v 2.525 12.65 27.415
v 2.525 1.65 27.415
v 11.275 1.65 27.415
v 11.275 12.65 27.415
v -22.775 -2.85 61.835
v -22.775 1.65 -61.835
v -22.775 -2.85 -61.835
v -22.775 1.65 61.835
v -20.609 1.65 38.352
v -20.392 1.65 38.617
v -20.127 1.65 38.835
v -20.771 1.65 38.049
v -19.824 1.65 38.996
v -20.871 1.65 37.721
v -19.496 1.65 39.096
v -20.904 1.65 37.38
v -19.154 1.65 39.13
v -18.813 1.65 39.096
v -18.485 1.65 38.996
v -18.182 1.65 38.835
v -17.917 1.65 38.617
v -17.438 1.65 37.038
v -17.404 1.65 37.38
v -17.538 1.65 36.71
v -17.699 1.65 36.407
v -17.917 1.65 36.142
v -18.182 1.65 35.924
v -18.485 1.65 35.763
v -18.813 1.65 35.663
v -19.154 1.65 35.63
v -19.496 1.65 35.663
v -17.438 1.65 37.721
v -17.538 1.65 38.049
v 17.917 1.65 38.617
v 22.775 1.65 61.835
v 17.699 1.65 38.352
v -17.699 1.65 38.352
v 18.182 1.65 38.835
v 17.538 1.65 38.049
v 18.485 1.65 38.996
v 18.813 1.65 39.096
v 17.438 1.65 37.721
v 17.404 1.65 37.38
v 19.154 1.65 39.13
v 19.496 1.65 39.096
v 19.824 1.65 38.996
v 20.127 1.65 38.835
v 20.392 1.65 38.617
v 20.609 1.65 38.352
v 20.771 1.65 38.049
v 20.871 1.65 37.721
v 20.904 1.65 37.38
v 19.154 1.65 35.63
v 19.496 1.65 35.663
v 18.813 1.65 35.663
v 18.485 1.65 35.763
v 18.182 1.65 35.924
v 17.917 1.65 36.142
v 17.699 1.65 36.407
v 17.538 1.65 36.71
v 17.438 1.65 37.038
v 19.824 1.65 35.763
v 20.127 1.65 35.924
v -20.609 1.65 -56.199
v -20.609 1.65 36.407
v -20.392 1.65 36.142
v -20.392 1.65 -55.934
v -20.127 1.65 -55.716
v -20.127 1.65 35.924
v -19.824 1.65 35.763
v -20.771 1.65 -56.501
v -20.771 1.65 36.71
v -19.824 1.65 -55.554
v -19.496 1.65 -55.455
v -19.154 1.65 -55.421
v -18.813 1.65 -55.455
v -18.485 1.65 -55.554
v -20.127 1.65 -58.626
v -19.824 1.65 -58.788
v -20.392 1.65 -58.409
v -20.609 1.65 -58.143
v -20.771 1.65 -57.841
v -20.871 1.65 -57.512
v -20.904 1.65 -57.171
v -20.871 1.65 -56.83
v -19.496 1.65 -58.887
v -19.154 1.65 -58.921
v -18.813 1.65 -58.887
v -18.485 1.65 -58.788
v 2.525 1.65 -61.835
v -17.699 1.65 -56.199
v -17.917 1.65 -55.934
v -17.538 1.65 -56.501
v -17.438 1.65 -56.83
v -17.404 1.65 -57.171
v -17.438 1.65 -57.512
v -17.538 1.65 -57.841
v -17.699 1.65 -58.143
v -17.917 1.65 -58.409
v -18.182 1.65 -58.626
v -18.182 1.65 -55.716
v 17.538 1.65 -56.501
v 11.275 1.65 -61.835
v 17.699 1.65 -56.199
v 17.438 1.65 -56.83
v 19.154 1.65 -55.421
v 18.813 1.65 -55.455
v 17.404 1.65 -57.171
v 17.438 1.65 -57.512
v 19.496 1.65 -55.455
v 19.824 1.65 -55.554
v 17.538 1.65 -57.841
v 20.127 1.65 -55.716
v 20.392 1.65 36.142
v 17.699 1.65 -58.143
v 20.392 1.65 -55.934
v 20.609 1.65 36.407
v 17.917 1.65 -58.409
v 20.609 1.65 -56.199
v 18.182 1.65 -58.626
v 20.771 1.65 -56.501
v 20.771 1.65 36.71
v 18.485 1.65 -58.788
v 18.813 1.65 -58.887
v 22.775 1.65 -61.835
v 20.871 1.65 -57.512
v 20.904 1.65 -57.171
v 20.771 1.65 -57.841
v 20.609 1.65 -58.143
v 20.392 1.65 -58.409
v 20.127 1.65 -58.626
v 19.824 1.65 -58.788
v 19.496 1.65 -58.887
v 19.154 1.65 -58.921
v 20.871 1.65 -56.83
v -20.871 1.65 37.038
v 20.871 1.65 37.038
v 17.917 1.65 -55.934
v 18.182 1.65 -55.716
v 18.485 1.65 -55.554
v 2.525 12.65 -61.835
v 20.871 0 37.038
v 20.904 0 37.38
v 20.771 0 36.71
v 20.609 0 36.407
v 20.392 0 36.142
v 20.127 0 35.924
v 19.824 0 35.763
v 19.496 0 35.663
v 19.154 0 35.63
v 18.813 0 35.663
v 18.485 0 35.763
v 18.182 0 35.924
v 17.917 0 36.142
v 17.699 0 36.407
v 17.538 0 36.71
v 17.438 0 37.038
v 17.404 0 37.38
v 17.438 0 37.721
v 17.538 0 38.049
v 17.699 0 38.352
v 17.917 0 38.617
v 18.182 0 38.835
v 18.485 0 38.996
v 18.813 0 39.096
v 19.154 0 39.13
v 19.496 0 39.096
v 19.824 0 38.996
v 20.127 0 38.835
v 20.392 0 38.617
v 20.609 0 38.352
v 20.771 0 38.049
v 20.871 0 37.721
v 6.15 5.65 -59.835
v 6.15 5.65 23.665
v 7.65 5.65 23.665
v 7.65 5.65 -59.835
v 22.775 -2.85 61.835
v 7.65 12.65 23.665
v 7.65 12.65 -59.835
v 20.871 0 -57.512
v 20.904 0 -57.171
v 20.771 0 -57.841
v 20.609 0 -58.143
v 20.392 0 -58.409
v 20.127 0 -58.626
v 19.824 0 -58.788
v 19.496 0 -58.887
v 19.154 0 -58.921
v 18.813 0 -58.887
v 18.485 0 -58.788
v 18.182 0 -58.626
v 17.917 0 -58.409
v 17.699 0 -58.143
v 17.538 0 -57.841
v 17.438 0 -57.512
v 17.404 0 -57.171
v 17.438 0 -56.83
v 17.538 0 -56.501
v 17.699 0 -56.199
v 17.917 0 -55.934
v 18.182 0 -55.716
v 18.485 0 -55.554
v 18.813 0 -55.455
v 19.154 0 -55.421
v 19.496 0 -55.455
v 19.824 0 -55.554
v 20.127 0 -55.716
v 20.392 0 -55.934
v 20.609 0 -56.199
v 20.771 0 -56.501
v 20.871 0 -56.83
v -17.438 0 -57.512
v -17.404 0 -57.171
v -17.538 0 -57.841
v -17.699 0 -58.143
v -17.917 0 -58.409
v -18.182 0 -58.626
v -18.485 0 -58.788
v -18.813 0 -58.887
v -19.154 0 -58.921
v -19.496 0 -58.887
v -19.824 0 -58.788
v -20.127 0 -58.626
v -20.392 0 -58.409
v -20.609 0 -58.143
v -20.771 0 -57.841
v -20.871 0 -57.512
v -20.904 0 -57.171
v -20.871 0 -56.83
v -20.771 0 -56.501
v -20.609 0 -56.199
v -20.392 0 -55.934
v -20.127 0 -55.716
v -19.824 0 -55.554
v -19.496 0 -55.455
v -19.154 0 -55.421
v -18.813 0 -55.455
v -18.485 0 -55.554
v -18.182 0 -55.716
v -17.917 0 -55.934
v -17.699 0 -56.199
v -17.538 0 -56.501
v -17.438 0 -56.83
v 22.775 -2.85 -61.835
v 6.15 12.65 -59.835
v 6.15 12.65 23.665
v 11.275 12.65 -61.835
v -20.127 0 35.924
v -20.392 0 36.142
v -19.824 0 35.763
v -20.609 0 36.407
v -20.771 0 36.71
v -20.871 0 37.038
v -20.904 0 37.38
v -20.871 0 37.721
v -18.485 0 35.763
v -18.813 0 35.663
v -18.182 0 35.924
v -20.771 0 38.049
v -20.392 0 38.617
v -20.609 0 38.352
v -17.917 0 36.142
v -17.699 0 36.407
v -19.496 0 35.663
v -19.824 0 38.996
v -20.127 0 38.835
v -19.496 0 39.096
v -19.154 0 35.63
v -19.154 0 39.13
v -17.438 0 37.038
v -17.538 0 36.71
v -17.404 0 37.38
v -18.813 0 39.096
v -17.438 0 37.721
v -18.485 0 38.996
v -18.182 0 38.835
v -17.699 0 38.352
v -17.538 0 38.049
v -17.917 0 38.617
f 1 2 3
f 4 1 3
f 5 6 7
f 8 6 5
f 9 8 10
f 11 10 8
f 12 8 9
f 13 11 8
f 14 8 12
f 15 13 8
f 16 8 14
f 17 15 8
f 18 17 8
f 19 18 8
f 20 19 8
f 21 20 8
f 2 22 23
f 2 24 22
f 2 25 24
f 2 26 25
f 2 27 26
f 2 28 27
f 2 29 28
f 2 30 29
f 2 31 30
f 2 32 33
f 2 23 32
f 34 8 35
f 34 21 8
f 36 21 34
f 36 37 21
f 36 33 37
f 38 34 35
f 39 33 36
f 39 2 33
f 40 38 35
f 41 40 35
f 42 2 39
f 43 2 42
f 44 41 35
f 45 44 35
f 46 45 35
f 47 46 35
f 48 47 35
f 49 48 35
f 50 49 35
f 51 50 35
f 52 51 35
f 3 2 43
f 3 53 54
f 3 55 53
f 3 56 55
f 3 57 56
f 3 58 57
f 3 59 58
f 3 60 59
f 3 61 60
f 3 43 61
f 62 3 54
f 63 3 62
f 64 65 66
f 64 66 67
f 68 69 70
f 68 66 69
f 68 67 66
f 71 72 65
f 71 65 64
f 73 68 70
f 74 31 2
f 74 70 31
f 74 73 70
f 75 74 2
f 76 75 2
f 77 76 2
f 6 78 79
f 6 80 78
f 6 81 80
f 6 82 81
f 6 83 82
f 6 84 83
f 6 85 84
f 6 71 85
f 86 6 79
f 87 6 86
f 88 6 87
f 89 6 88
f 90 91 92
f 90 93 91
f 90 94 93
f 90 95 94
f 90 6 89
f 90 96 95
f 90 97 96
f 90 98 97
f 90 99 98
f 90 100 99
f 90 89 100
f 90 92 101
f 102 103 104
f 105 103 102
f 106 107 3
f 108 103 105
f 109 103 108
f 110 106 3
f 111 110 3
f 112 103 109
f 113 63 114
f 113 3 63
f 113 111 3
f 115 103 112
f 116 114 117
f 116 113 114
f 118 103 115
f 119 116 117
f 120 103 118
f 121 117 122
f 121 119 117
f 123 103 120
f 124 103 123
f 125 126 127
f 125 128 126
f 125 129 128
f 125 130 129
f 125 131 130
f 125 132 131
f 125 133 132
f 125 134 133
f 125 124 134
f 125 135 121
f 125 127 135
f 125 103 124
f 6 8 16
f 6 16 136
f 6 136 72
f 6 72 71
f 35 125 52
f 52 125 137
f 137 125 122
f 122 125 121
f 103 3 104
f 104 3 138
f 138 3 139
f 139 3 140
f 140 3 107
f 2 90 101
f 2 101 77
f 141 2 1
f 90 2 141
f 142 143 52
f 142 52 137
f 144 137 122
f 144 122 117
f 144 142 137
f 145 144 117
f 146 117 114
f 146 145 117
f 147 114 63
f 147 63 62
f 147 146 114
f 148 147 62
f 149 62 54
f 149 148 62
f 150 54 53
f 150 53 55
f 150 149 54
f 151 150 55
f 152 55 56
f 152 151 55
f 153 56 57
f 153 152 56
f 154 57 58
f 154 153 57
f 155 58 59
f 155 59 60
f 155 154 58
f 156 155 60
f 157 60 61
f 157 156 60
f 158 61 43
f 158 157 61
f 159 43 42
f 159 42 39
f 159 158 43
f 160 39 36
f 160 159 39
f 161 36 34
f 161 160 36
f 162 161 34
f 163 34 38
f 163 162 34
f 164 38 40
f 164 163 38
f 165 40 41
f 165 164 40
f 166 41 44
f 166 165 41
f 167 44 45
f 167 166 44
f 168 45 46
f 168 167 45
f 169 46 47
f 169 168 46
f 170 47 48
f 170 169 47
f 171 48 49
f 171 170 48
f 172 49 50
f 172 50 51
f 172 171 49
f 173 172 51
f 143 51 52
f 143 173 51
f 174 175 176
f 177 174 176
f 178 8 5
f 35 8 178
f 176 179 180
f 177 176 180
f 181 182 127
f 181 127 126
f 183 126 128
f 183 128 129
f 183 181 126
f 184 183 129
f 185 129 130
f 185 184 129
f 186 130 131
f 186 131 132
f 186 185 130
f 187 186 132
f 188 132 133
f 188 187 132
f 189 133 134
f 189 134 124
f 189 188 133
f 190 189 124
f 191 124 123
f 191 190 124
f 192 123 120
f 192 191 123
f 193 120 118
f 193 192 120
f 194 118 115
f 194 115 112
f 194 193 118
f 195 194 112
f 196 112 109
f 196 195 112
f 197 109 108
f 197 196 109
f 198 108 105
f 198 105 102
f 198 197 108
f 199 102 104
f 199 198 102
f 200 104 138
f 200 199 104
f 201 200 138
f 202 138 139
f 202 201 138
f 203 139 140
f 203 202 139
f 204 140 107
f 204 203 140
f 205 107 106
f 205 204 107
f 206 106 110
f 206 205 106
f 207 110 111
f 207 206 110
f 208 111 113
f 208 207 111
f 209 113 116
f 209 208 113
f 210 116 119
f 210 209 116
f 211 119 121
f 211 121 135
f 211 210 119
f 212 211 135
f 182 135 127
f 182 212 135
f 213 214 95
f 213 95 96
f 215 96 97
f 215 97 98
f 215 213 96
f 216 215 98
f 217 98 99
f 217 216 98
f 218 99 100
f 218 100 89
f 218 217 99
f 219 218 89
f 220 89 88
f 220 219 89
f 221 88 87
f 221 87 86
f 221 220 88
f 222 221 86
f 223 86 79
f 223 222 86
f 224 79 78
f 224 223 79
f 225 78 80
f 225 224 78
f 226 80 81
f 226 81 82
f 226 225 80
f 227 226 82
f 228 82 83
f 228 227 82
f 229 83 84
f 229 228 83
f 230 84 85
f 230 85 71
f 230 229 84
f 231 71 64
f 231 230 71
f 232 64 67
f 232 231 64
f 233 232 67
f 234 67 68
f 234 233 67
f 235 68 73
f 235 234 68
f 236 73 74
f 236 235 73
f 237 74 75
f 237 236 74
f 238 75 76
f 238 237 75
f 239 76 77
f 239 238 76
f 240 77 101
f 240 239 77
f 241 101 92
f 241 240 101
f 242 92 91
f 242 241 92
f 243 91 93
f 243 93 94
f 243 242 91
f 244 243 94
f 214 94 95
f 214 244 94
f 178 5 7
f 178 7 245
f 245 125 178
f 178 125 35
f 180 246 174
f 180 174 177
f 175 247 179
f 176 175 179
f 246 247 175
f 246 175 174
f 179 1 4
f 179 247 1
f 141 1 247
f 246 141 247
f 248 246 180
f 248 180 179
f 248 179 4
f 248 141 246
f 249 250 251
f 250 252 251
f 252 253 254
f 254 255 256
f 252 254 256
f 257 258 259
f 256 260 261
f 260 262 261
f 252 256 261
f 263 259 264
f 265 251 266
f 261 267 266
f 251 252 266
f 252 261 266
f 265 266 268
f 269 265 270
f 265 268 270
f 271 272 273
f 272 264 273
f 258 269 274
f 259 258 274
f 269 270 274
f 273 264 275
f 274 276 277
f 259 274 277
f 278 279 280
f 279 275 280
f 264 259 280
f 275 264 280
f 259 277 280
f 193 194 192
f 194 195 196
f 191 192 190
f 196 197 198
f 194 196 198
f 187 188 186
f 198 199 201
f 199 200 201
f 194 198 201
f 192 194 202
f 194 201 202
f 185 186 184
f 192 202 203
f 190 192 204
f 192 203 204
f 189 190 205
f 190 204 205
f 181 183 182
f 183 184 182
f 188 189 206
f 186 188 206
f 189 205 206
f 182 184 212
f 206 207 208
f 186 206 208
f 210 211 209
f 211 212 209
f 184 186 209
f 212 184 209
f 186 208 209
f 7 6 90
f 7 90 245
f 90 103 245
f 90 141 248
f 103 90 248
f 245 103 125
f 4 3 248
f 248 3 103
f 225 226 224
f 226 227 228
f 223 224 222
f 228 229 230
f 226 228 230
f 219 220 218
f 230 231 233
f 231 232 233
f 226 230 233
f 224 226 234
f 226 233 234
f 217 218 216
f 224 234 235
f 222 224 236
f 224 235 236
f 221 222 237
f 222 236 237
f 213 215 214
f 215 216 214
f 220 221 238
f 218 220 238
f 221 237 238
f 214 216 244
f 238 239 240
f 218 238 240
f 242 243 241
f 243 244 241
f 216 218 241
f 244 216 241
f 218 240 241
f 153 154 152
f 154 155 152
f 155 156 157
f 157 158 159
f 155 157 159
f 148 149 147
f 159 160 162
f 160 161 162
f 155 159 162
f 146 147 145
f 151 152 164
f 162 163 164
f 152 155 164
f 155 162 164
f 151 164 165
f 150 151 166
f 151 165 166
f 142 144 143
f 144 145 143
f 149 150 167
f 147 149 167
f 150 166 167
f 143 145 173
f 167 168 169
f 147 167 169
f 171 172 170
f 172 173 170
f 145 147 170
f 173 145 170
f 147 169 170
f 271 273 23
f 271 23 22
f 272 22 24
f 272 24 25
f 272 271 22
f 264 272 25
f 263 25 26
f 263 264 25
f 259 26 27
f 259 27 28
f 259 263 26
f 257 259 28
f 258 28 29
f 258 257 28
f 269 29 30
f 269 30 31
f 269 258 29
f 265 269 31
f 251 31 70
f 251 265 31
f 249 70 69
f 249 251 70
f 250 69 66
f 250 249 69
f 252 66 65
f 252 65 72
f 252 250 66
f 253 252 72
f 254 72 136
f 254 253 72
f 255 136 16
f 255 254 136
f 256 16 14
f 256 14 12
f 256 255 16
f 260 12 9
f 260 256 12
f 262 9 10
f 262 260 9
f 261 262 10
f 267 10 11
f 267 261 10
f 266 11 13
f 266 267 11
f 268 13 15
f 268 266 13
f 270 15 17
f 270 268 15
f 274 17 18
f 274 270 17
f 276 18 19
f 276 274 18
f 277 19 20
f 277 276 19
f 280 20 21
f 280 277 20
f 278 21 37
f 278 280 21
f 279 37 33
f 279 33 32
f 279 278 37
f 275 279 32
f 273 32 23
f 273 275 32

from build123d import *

# Parameters (mm, degrees)
SKETCH1_W           = 45.55
SKETCH1_H           = 123.67
SKETCH1_R           = 1.75
BOSS_EXTRUDE1_DEPTH = 1.65
SKETCH2_W           = 45.55
SKETCH2_H           = 123.67
BOSS_EXTRUDE2_DEPTH = 2.85
SKETCH3_W           = 8.75
SKETCH3_H           = 89.25
BOSS_EXTRUDE3_DEPTH = 11
SKETCH4_W           = 1.5
SKETCH4_H           = 83.5
CUT_EXTRUDE1_DEPTH  = 7


with BuildPart() as part:
    # Sketch1 → Boss-Extrude1 (new body)
    with BuildSketch(Plane(origin=(0, 0, 0), x_dir=(1, 0, 0), z_dir=(0, 1, 0))):
        Rectangle(SKETCH1_W, SKETCH1_H)
        with Locations((-19.154293565, -37.379539044)):
            Circle(SKETCH1_R, mode=Mode.SUBTRACT)
        with Locations((-19.154293565, 57.171070526)):
            Circle(SKETCH1_R, mode=Mode.SUBTRACT)
        with Locations((19.154293565, -37.379539044)):
            Circle(SKETCH1_R, mode=Mode.SUBTRACT)
        with Locations((19.154293565, 57.171070526)):
            Circle(SKETCH1_R, mode=Mode.SUBTRACT)
    extrude(amount=BOSS_EXTRUDE1_DEPTH)

    # Sketch2 → Boss-Extrude2 (add)
    with BuildSketch(Plane.XZ):
        Rectangle(SKETCH2_W, SKETCH2_H)
    extrude(amount=BOSS_EXTRUDE2_DEPTH)

    # Sketch3 → Boss-Extrude3 (add)
    with BuildSketch(Plane(origin=(0, 1.65, 0), x_dir=(1, 0, 0), z_dir=(0, 1, 0))):
        with Locations((6.9, 17.21)):
            Rectangle(SKETCH3_W, SKETCH3_H)
    extrude(amount=BOSS_EXTRUDE3_DEPTH)

    # Sketch4 → Cut-Extrude1 (cut)
    with BuildSketch(Plane(origin=(0, 12.65, 0), x_dir=(1, 0, 0), z_dir=(0, 1, 0))):
        with Locations((6.9, 18.085)):
            Rectangle(SKETCH4_W, SKETCH4_H)
    extrude(amount=-CUT_EXTRUDE1_DEPTH, mode=Mode.SUBTRACT)


solid = part.part
